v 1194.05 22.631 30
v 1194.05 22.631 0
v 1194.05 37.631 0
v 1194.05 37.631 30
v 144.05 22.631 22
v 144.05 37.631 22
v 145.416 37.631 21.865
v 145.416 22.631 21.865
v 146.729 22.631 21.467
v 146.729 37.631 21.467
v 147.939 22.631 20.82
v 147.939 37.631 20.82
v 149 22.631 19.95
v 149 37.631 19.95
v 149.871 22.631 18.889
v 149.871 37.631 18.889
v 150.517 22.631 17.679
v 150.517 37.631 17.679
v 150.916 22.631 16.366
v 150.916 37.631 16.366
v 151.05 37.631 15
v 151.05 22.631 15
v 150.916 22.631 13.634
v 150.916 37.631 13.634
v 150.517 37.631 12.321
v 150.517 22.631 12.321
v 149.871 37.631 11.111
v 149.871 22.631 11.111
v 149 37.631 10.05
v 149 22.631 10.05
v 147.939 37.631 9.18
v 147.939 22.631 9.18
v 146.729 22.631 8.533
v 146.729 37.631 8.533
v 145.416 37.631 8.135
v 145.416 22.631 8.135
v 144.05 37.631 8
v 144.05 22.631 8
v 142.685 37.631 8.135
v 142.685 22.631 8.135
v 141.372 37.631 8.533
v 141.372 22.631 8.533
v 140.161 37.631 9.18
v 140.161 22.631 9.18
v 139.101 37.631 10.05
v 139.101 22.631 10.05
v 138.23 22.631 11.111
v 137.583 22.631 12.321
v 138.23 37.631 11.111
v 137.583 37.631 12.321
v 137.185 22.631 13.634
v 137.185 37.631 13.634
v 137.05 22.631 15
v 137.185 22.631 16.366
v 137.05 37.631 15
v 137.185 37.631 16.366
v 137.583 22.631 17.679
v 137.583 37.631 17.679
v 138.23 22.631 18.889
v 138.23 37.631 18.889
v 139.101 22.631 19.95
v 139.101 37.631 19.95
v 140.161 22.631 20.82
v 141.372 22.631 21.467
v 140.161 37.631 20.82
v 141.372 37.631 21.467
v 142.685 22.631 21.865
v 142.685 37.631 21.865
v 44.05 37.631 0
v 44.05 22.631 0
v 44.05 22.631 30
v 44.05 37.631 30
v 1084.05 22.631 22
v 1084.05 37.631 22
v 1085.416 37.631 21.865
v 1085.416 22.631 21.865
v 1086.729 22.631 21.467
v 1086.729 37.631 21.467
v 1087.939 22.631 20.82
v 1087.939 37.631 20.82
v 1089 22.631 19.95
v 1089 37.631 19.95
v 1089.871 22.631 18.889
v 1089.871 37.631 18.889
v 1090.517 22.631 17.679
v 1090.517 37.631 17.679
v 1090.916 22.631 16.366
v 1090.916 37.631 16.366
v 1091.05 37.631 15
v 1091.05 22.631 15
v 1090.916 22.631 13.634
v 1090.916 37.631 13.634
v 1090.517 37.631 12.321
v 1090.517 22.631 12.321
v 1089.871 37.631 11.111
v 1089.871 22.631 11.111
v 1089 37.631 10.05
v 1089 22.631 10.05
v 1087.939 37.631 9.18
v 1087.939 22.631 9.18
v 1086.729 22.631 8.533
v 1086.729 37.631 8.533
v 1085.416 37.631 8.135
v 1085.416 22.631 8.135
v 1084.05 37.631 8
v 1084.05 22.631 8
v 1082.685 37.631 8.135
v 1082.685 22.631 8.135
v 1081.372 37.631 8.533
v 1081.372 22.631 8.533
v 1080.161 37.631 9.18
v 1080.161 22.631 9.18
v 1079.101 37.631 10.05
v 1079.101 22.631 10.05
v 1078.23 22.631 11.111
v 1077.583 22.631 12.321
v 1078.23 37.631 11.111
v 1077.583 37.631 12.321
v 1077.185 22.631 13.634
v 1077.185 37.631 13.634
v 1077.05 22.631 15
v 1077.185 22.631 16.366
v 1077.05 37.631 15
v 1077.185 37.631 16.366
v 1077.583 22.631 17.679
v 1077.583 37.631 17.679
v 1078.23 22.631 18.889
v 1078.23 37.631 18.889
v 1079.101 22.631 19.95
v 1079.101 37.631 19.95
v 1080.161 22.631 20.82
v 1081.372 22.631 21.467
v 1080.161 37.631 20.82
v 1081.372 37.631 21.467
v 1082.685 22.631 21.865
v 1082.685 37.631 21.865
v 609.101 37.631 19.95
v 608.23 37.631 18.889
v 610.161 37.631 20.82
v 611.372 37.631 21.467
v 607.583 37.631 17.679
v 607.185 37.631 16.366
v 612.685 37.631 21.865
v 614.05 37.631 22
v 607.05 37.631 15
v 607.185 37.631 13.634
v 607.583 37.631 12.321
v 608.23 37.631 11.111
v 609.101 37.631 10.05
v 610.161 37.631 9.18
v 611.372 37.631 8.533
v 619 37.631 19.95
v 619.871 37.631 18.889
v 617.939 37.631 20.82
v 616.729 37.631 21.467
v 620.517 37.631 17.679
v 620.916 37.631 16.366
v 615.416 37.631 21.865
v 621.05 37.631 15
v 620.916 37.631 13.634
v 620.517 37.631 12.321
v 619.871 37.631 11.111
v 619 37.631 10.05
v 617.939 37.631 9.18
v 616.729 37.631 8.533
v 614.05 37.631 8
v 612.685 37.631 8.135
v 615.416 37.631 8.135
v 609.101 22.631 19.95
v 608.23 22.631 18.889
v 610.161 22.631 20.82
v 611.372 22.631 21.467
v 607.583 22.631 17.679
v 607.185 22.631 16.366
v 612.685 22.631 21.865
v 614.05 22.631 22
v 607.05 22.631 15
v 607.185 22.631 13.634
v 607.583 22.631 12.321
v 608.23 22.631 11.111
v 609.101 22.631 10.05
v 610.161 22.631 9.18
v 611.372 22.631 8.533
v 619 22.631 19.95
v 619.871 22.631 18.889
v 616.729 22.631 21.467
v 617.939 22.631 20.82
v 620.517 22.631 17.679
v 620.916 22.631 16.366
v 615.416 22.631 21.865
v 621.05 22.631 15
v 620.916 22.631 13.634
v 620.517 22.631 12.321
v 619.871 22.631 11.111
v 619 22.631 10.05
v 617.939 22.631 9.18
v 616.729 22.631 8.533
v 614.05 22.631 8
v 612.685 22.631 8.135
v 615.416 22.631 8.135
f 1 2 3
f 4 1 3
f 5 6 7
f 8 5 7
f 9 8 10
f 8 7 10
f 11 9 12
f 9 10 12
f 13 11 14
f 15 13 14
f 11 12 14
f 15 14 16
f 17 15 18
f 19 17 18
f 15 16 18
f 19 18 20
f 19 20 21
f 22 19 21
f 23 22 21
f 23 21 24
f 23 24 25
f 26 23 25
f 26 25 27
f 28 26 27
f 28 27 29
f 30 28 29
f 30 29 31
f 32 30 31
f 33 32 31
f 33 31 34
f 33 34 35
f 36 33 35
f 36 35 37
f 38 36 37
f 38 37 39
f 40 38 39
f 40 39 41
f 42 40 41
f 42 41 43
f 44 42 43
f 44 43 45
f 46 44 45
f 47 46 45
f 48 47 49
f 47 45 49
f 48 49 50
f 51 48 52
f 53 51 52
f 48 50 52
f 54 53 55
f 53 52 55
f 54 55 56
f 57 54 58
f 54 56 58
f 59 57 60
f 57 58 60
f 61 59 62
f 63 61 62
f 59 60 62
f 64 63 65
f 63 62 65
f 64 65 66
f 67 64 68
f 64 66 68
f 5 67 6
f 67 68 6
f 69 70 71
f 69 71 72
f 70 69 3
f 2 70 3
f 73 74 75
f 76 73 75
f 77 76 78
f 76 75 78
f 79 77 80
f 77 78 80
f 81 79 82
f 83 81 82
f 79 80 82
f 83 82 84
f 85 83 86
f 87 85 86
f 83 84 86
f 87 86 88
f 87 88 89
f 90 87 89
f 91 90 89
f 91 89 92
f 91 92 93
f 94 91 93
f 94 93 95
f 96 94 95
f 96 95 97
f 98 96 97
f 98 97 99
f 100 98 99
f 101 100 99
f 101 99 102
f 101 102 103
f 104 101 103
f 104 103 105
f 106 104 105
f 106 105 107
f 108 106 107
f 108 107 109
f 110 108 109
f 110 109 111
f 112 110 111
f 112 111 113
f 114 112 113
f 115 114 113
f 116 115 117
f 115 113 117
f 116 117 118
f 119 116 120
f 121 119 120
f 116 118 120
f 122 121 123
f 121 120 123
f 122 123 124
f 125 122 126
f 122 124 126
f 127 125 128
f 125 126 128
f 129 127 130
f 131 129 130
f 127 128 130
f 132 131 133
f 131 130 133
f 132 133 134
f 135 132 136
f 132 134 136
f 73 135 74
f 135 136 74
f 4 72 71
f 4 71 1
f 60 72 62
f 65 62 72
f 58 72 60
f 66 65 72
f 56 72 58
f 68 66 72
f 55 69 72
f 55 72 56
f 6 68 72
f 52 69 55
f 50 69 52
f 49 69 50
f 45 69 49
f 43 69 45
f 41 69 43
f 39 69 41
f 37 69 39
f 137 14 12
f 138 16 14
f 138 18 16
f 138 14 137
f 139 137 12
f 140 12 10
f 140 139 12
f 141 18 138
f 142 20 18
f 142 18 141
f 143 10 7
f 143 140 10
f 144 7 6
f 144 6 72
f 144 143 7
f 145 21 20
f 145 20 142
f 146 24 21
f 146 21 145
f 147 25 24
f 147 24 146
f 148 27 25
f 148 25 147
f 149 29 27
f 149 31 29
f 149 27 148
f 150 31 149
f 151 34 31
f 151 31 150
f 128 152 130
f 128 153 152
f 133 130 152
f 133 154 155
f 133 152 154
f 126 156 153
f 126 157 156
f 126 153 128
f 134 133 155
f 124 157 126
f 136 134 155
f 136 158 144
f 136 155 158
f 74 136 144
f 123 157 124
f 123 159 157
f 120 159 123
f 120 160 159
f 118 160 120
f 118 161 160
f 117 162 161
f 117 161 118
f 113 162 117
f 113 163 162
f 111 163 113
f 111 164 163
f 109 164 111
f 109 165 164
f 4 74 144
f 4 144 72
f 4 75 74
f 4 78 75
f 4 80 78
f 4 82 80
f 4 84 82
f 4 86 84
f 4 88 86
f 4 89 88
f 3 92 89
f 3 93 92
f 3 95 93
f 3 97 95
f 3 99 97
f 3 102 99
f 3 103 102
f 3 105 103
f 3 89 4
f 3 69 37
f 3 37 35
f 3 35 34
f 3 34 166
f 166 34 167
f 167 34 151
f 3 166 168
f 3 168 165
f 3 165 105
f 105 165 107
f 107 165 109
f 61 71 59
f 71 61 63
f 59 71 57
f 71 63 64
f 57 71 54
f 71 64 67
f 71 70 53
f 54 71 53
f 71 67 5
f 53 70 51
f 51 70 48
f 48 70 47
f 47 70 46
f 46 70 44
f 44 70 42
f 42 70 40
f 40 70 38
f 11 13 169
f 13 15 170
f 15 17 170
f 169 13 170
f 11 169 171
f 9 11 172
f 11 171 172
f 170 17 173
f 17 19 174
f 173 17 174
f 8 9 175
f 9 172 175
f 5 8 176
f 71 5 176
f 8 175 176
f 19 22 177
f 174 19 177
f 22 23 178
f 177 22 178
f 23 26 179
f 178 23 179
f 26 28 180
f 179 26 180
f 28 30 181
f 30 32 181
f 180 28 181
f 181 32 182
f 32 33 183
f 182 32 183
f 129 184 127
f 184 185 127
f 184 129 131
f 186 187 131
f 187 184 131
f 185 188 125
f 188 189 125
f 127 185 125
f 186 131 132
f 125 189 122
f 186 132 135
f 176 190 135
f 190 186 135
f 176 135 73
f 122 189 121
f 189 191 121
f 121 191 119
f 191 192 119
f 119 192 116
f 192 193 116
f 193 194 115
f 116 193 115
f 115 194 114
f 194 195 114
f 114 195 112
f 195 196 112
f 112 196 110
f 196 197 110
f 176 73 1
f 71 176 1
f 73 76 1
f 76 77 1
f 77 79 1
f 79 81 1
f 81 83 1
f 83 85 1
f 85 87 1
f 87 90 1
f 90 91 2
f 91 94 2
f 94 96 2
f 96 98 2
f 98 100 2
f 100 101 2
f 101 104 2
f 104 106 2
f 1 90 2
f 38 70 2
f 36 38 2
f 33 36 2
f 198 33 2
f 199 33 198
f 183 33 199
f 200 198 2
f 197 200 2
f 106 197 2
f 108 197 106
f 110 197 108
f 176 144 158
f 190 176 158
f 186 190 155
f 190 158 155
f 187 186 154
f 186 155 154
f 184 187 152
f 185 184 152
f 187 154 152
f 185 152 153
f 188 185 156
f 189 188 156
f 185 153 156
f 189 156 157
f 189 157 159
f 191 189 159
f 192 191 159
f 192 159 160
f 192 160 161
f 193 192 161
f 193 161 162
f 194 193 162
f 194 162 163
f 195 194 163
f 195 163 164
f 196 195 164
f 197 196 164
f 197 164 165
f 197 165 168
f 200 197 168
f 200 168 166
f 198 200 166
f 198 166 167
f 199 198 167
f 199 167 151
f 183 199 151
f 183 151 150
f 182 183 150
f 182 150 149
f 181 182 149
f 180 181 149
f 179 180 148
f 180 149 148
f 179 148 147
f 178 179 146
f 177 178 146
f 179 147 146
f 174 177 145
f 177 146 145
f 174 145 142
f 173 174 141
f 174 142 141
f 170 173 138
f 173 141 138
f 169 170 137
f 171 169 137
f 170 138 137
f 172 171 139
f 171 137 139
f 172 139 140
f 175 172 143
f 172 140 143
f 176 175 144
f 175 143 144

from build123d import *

# Parameters (mm, degrees)
SKETCH_1_W          = 1150
SKETCH_1_H          = 15
EXTRUDE_1_DEPTH     = 30
SKETCH_2_R          = 7
CUT_EXTRUDE_1_DEPTH = 1195.521313651


with BuildPart() as part:
    # Эскиз1 → Бобышка-Вытянуть1 (new body)
    with BuildSketch(Plane.XY):
        with Locations((619.050320868, 30.131091658)):
            Rectangle(SKETCH_1_W, SKETCH_1_H)
    extrude(amount=EXTRUDE_1_DEPTH)

    # Эскиз2 → Вырез-Вытянуть1 (cut, through all)
    with BuildSketch(Plane(origin=(0, 37.631091658, 0), x_dir=(1, 0, 0), z_dir=(0, 1, 0))):
        with Locations(Location((144.050320868, -15, 0), (0, 0, 270))):
            Circle(SKETCH_2_R)
        with Locations(Location((614.050320868, -15, 0), (0, 0, 270))):
            Circle(SKETCH_2_R)
        with Locations(Location((1084.050320868, -15, 0), (0, 0, 270))):
            Circle(SKETCH_2_R)
    extrude(amount=-CUT_EXTRUDE_1_DEPTH, mode=Mode.SUBTRACT)


solid = part.part
